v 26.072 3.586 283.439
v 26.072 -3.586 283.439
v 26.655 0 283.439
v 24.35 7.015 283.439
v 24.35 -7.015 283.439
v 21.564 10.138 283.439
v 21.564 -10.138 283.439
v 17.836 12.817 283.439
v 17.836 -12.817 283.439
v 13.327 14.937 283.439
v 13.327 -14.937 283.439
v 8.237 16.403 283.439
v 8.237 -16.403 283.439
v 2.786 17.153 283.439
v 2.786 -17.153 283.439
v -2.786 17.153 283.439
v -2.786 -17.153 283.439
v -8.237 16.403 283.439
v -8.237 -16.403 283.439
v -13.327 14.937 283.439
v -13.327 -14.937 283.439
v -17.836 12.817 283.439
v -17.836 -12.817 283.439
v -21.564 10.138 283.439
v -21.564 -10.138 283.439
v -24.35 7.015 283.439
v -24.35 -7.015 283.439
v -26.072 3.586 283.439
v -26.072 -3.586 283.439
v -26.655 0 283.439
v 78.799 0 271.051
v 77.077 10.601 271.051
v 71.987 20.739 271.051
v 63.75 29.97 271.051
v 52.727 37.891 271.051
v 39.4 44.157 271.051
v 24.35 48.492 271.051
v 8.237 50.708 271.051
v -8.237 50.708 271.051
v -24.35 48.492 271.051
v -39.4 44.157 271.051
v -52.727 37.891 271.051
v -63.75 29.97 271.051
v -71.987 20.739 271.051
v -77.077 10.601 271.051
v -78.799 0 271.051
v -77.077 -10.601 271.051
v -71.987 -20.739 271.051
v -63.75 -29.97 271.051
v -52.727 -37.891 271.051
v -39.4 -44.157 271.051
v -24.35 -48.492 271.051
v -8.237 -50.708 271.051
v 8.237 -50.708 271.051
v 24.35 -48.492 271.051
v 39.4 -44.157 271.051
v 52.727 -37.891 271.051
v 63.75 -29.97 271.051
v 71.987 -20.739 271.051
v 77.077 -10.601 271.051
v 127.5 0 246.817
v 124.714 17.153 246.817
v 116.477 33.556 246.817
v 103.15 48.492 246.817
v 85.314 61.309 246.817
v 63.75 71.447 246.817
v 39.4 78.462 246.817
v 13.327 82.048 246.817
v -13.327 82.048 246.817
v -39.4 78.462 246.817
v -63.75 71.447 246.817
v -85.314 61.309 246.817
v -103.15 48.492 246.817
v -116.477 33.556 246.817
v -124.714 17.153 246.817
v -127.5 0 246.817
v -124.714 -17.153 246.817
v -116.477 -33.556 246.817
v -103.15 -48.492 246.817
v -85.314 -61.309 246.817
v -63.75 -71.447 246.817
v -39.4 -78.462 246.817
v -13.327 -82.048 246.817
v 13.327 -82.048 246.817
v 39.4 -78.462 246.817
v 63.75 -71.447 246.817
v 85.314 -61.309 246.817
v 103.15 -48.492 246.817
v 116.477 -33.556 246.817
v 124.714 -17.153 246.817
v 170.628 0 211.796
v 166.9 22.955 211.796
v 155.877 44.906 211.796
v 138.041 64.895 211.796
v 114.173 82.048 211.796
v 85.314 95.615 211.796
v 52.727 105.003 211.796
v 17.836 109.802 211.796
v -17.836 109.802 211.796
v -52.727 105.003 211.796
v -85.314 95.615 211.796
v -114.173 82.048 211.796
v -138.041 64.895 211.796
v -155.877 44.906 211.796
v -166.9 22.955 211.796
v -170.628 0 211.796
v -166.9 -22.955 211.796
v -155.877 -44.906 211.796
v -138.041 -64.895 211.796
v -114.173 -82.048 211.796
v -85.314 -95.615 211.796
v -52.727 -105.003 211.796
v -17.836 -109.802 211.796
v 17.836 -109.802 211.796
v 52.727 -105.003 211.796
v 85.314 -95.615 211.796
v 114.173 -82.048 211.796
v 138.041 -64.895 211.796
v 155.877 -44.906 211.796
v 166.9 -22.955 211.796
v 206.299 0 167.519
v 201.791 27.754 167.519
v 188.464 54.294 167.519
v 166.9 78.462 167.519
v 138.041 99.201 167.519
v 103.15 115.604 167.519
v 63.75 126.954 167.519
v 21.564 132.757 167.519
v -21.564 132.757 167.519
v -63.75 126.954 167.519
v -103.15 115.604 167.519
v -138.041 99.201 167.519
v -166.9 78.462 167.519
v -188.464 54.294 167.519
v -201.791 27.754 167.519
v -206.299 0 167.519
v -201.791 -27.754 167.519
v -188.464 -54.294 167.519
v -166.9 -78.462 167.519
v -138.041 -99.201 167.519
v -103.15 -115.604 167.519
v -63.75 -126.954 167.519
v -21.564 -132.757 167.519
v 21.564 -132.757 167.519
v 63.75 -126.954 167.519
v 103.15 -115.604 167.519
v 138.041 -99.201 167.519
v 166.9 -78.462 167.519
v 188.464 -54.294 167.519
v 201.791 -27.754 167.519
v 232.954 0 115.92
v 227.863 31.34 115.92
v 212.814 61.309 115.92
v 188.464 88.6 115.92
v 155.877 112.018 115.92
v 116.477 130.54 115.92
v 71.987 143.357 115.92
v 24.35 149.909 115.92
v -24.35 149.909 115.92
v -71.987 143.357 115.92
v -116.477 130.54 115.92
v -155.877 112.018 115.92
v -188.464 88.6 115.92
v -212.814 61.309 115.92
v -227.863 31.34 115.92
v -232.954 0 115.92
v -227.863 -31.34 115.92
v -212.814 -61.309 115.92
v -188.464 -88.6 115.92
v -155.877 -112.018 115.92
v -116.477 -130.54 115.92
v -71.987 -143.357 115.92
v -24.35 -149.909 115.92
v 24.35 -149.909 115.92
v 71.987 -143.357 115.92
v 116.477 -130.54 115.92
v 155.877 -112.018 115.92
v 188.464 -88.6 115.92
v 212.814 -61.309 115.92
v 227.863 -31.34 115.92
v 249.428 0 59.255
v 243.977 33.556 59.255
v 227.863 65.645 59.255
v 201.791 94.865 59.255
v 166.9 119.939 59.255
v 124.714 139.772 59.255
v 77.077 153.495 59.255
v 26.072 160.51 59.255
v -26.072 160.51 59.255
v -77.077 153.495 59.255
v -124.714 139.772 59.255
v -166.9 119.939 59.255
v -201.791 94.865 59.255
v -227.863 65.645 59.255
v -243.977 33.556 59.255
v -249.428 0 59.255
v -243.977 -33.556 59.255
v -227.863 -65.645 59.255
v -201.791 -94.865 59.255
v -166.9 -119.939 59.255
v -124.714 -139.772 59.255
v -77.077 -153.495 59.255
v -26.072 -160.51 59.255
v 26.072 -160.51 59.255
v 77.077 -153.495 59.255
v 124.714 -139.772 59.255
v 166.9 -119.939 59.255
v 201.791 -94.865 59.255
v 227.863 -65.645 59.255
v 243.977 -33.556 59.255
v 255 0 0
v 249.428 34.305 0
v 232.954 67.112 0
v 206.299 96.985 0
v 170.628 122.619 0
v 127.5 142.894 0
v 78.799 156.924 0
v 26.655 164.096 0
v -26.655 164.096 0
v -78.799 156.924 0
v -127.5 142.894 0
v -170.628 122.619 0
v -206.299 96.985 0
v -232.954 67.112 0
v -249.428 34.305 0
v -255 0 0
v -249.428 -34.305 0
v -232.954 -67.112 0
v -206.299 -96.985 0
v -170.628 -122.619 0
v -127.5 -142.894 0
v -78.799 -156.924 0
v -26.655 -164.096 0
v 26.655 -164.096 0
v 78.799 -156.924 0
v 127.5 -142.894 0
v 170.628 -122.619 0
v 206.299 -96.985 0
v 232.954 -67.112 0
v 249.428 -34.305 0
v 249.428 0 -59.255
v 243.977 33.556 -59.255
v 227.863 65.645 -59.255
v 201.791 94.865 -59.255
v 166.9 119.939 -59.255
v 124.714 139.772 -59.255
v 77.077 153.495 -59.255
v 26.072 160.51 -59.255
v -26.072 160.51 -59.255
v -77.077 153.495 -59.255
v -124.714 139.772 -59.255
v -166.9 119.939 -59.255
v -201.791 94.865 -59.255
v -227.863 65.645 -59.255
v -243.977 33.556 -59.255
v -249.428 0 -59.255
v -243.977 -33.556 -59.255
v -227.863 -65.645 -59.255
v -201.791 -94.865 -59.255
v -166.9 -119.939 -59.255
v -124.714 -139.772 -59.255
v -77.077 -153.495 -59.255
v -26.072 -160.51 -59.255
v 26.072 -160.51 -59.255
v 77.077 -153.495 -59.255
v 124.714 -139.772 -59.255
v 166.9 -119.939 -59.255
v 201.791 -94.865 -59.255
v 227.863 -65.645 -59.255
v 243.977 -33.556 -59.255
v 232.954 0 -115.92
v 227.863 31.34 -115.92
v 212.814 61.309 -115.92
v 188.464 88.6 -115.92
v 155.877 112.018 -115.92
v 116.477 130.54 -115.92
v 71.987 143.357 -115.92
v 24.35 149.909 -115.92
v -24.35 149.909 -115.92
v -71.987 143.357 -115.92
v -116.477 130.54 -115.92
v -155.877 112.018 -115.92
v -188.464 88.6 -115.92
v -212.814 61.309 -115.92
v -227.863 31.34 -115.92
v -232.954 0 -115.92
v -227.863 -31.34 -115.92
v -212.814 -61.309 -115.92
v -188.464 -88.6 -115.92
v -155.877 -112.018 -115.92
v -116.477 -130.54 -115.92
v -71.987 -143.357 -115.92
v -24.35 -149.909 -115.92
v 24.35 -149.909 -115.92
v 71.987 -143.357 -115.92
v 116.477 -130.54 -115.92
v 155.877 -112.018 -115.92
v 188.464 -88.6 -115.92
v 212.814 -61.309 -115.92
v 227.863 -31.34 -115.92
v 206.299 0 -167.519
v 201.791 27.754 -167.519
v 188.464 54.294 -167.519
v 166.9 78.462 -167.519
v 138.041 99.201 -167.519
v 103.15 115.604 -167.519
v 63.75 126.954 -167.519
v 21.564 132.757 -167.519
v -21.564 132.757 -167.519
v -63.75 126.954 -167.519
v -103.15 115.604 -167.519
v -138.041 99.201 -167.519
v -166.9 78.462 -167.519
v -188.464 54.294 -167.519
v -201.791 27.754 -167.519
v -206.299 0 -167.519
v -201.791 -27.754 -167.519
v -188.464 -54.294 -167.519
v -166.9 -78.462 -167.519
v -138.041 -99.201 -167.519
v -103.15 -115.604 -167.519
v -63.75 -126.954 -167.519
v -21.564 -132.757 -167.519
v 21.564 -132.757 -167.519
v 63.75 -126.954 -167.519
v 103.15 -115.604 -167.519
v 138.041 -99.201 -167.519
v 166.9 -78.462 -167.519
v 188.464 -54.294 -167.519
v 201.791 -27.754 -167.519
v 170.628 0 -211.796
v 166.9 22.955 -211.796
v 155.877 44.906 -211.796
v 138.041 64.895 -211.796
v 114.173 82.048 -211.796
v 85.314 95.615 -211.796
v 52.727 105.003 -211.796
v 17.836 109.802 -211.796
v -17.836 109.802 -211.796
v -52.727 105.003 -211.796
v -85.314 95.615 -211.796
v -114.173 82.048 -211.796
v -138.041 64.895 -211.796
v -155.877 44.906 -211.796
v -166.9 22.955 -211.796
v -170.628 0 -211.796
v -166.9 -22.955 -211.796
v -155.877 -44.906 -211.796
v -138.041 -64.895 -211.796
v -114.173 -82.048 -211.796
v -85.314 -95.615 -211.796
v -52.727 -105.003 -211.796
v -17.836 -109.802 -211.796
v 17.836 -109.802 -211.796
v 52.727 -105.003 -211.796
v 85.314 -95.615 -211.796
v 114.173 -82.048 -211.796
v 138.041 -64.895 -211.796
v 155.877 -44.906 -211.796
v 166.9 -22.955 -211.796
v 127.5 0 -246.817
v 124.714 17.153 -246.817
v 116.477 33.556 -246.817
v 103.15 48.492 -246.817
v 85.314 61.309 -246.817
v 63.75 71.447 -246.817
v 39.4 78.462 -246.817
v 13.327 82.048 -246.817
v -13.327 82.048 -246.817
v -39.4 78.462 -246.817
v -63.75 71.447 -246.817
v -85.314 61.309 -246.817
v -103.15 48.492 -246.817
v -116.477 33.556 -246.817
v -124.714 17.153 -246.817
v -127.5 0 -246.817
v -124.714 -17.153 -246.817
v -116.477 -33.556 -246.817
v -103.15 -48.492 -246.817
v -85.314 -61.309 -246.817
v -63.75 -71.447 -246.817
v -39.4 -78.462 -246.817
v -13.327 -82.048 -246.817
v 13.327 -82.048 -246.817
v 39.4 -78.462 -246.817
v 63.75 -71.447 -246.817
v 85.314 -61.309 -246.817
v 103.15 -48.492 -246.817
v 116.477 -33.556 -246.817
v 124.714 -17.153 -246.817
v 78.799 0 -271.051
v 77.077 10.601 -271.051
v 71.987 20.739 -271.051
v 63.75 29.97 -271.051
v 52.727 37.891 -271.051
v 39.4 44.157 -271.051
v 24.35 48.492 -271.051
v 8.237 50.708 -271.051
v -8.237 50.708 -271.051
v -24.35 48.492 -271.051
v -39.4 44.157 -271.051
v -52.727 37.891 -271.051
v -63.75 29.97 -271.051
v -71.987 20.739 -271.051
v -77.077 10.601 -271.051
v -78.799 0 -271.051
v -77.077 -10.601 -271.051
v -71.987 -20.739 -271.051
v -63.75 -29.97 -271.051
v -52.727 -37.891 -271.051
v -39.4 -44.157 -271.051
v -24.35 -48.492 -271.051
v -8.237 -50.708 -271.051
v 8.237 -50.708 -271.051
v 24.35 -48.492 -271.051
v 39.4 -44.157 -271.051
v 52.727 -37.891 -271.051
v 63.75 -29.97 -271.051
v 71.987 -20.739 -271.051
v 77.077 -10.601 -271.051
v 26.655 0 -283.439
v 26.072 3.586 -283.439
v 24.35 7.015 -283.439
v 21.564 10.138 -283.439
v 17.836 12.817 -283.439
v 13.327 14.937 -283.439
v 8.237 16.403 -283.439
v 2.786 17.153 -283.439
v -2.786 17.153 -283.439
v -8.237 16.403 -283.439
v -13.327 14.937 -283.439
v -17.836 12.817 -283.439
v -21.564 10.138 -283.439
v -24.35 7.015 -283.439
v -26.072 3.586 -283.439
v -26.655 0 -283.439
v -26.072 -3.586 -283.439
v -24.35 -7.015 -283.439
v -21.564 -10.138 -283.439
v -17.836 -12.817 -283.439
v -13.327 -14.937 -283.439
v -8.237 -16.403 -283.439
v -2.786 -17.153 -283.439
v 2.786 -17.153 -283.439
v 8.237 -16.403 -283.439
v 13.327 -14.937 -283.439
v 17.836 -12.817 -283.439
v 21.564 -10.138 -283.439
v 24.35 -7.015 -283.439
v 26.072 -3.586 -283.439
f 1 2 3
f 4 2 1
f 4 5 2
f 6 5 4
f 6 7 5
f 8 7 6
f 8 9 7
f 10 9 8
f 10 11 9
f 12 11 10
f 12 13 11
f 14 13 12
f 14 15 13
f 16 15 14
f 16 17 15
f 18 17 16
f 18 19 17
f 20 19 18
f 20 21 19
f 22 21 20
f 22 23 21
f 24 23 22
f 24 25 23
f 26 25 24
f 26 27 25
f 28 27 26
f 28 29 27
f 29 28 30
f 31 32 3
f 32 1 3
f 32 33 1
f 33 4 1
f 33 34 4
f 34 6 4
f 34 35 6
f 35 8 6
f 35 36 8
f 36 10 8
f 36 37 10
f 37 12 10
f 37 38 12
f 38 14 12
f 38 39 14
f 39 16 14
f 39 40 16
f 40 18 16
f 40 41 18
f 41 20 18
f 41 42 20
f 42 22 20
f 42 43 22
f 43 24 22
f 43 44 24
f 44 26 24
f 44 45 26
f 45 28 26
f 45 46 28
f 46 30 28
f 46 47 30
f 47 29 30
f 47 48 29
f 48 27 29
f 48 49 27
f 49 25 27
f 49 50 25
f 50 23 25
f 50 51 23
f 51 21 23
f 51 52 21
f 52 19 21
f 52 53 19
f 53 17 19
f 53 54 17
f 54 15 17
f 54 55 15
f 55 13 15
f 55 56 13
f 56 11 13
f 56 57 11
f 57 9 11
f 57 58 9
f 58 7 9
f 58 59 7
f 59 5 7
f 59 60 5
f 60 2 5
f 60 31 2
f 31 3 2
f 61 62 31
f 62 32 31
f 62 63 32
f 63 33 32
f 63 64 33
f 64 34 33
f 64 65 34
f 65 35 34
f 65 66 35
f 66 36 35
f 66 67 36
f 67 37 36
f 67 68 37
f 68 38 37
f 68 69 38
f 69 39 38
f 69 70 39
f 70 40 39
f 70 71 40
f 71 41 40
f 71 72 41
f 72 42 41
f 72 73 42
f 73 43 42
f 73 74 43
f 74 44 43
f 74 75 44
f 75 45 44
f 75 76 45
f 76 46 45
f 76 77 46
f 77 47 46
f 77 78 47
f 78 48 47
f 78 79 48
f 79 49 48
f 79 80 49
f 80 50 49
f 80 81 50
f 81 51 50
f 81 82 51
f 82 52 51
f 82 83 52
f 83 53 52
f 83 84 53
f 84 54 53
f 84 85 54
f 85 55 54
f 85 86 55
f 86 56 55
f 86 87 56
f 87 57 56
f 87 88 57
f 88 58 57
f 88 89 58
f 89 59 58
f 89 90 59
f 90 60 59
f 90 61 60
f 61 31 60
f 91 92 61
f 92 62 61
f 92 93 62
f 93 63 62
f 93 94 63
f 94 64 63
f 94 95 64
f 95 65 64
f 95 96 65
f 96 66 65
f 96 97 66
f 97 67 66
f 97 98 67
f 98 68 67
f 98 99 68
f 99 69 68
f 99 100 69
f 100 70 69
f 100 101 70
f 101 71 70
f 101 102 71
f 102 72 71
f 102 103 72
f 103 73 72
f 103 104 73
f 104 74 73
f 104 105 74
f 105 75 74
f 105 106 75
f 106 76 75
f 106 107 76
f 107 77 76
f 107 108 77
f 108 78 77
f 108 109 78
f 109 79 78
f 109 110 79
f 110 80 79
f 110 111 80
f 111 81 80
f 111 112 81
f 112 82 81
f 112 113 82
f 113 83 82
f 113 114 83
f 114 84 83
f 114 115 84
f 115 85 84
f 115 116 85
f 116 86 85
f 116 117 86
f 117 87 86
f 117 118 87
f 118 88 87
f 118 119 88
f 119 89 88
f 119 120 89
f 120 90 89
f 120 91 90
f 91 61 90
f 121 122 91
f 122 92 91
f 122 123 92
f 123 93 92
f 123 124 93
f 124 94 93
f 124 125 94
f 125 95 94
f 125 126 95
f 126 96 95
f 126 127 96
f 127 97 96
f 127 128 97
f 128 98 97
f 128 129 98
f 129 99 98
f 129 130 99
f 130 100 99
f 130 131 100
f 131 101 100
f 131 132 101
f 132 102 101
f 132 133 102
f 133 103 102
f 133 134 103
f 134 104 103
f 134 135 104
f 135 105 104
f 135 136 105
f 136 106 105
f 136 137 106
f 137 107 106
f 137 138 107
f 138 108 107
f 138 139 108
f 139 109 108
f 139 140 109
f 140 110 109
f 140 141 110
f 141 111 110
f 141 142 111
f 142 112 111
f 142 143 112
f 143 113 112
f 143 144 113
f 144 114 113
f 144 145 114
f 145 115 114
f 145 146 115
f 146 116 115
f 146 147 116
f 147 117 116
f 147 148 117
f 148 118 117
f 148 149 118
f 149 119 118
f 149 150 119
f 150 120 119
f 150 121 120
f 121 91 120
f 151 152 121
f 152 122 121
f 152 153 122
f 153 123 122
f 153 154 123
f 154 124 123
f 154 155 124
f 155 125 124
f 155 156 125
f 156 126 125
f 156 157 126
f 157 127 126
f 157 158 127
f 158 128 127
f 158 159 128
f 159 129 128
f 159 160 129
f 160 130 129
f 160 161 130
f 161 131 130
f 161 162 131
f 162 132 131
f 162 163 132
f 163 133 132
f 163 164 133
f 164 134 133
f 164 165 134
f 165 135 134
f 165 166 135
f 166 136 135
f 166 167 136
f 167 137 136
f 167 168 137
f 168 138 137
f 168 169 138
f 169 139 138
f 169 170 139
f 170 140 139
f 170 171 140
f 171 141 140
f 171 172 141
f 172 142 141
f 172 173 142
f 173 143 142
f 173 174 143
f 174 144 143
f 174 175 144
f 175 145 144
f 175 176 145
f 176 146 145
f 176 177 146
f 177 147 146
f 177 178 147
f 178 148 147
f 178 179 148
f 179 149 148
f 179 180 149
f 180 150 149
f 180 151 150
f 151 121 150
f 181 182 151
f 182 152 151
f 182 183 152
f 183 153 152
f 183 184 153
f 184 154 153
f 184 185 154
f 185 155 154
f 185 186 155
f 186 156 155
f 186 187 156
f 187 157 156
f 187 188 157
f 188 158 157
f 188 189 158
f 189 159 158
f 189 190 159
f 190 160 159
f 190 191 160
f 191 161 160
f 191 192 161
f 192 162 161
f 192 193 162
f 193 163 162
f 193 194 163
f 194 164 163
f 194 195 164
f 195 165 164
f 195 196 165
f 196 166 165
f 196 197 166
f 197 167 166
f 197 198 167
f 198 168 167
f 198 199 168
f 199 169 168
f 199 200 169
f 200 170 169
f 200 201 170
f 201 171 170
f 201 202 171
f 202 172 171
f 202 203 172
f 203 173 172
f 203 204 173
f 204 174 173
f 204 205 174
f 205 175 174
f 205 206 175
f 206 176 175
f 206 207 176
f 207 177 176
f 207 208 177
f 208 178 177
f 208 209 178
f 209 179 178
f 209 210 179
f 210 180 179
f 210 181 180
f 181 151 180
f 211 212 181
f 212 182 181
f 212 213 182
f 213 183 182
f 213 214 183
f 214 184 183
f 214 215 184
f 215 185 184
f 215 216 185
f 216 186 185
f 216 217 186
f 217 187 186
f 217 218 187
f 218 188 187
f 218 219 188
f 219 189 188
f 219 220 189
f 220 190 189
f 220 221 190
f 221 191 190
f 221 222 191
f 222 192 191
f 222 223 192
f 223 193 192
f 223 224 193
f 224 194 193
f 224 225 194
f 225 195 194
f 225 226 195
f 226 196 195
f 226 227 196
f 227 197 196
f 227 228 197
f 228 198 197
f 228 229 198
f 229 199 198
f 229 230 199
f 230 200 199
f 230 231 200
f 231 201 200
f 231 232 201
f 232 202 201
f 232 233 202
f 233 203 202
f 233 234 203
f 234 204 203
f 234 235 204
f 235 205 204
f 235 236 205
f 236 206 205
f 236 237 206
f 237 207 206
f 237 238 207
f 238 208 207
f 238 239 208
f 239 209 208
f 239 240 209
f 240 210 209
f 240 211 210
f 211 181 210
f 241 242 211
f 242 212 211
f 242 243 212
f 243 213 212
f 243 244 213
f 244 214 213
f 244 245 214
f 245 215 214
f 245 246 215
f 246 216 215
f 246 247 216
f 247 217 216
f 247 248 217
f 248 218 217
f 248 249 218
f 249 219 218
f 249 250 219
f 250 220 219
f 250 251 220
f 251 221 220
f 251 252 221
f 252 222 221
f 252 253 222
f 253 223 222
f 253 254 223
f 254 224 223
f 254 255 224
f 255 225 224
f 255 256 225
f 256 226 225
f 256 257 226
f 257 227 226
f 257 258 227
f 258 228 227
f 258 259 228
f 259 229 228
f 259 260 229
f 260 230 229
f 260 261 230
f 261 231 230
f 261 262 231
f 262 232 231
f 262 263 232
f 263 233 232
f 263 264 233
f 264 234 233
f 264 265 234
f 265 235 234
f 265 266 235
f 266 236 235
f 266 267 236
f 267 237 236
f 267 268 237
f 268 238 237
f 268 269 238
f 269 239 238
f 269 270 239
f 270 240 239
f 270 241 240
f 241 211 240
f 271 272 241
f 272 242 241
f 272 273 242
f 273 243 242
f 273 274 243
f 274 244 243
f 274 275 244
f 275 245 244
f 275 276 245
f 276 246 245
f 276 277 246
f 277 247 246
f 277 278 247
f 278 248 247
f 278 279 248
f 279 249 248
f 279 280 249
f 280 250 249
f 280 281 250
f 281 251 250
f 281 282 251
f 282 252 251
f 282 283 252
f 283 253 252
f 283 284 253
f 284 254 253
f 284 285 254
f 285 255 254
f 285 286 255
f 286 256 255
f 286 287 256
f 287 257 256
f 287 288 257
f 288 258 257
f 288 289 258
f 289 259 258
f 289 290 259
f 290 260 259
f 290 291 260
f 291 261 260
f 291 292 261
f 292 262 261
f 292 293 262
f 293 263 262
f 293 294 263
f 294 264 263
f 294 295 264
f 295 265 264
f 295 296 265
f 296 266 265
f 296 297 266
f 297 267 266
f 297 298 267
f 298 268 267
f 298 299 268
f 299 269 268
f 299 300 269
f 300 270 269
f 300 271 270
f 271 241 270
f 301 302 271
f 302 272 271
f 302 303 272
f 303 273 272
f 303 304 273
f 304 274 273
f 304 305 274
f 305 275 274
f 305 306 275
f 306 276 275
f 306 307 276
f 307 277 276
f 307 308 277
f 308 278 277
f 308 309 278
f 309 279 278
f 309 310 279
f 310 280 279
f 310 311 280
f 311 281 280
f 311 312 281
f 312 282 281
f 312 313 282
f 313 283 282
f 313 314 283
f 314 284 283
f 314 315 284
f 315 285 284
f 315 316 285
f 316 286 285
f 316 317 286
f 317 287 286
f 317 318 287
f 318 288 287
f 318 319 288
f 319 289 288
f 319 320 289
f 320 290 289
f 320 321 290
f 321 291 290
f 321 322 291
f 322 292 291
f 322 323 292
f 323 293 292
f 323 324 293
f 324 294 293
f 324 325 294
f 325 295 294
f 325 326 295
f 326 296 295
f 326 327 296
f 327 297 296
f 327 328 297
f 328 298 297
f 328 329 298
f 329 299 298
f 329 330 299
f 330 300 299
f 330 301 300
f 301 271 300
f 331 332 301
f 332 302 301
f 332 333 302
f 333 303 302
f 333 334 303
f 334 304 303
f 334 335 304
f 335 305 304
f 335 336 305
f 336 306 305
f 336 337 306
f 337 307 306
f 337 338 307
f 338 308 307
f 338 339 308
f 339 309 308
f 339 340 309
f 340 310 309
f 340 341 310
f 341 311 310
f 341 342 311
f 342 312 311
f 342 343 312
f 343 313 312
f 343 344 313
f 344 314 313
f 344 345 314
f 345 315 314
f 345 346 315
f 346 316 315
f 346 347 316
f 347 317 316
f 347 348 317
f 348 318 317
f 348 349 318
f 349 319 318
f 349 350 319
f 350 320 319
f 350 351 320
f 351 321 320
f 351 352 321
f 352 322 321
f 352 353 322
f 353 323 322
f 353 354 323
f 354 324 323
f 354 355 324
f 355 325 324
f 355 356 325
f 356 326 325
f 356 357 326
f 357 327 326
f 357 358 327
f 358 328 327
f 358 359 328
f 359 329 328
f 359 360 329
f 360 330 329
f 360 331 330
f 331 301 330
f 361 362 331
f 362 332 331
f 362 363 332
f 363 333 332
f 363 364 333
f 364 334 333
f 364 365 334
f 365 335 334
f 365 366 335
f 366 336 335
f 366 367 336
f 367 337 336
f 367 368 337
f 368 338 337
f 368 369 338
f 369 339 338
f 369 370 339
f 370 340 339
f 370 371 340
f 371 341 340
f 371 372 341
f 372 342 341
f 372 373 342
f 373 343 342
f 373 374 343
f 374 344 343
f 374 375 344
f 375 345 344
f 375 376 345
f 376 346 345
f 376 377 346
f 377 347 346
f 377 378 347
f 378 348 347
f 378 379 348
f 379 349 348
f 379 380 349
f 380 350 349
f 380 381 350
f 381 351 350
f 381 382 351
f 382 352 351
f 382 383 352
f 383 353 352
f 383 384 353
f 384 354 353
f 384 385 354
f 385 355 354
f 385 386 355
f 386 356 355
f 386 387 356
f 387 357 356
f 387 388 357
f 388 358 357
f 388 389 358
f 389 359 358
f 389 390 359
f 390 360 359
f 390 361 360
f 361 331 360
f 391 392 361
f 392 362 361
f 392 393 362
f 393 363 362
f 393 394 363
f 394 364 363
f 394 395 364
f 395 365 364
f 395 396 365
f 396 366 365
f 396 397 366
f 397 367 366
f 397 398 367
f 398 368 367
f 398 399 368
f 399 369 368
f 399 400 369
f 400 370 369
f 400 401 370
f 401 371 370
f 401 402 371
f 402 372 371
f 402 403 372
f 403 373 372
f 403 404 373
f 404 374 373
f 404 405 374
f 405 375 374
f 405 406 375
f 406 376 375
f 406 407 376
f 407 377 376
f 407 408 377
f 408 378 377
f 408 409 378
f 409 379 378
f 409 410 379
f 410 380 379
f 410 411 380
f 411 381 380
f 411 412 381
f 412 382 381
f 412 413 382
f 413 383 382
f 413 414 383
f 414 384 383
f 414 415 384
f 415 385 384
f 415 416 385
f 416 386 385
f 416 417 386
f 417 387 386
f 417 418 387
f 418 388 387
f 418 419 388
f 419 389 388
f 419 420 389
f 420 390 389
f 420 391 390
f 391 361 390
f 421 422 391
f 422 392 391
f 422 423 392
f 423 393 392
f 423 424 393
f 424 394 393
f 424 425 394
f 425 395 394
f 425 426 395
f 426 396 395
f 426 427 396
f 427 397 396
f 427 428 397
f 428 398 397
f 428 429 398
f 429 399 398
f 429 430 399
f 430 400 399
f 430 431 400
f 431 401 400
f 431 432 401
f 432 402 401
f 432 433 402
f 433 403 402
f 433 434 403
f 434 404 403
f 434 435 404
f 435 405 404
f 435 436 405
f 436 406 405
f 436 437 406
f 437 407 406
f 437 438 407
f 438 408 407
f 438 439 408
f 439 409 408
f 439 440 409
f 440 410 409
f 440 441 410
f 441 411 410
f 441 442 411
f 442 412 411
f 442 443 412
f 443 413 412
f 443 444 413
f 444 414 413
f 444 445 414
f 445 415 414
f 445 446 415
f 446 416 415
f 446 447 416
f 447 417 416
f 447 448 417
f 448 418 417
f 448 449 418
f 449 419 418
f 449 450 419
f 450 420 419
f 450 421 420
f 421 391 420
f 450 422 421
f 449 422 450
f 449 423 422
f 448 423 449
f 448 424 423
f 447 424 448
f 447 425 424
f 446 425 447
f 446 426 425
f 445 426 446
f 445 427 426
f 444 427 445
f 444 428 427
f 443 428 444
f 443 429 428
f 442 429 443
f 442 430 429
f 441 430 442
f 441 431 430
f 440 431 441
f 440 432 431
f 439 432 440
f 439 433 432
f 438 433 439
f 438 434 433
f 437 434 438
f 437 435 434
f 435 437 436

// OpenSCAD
// Generated by SolidPython 1.0.1 on 2020-07-29 00:46:53


scale(v = [17, 11, 19]) {
	sphere(r = 15);
}
/***********************************************
*********      SolidPython code:      **********
************************************************
 
# import packages: SolidPython
from solid import *
from solid.utils import *
from itertools import chain, combinations, permutations


class Resize:

    def __init__(self, scad_file):
        self.scad_file = scad_file
        #self.scad_file = import_scad(scad_file)
        # cone/cylinder param:
        self.r1 = 0
        self.r2 = 0
        self.h = 0
        # rectangular prism param:
        self.w = 0
        self.l = 0
        # ellipse param:
        self.r = 0

    # import OpenScad code (file name corresponds to shape)


    # classify shape + parameters
    def assign(self, param1, param2, param3):
        if self.scad_file == 'cone.scad':
            self.r1 = param1
            self.r2 = param2
            self.h = param3
        elif self.scad_file == 'cylinder.scad':
            self.r1 = param1
            self.r2 = param2
            self.h = param3
        elif self.scad_file == 'rectangularPrism.scad':
            self.h = param1
            self.l = param2
            self.w = param3
        else:
            self.r = param1
            self.h = param2

    # resize parameters
    def iterate(self):
        x = range(3, 20, 2)
        i = 1
        if self.scad_file == 'cone.scad':
            tempList = list(permutations(x, 2))
            for temp in tempList:
                param1 = temp[0]
                param2 = temp[1]
                filepath = 'produced_scad_files/' + 'cone' + str(param1) + '_' + str(param2) + '_' + '.scad'
                scad_render_to_file(cylinder(h=param1, r1=param2, r2=0), filepath)

        elif self.scad_file == 'cylinder.scad':
            tempList = list(permutations(x, 3))
            for temp in tempList:
                param1 = temp[0]
                param2 = temp[1]
                filepath = 'produced_scad_files/' + 'cylinder' + str(param1) + '_' + str(param2) + '_' + '.scad'
                scad_render_to_file(cylinder(h=param1, r1=param2, r2=param2), filepath)

        elif self.scad_file == 'rectangularPrism.scad':
            tempList = list(permutations(x, 3))
            for temp in tempList:
                param1 = temp[0]
                param2 = temp[1]
                param3 = temp[2]
                filepath = 'produced_scad_files/' + 'rectangularPrism' + str(param1) + '_' + str(param2) + '_' + str(
                    param3) + '.scad'
                scad_render_to_file(cube(size=(param1, param2, param3)), filepath)

        elif self.scad_file == 'ellipse.scad':
            tempList = list(permutations(x, 4))
            for temp in tempList:
                param1 = temp[0]
                param2 = temp[1]
                param3 = temp[2]
                param4 = temp[3]
                filepath = 'produced_scad_files/' + 'ellipse' + str(param1) + '_' + str(param2) + '_' + str(param3) + '_' + str(param4) + '.scad'
                scad_render_to_file(scale([param1, param2, param3])(sphere(r=param4)), filepath)

    def render_to_scadfile(self):
        scad_render_to_file(scad, 'example.scad') 
 
************************************************/
